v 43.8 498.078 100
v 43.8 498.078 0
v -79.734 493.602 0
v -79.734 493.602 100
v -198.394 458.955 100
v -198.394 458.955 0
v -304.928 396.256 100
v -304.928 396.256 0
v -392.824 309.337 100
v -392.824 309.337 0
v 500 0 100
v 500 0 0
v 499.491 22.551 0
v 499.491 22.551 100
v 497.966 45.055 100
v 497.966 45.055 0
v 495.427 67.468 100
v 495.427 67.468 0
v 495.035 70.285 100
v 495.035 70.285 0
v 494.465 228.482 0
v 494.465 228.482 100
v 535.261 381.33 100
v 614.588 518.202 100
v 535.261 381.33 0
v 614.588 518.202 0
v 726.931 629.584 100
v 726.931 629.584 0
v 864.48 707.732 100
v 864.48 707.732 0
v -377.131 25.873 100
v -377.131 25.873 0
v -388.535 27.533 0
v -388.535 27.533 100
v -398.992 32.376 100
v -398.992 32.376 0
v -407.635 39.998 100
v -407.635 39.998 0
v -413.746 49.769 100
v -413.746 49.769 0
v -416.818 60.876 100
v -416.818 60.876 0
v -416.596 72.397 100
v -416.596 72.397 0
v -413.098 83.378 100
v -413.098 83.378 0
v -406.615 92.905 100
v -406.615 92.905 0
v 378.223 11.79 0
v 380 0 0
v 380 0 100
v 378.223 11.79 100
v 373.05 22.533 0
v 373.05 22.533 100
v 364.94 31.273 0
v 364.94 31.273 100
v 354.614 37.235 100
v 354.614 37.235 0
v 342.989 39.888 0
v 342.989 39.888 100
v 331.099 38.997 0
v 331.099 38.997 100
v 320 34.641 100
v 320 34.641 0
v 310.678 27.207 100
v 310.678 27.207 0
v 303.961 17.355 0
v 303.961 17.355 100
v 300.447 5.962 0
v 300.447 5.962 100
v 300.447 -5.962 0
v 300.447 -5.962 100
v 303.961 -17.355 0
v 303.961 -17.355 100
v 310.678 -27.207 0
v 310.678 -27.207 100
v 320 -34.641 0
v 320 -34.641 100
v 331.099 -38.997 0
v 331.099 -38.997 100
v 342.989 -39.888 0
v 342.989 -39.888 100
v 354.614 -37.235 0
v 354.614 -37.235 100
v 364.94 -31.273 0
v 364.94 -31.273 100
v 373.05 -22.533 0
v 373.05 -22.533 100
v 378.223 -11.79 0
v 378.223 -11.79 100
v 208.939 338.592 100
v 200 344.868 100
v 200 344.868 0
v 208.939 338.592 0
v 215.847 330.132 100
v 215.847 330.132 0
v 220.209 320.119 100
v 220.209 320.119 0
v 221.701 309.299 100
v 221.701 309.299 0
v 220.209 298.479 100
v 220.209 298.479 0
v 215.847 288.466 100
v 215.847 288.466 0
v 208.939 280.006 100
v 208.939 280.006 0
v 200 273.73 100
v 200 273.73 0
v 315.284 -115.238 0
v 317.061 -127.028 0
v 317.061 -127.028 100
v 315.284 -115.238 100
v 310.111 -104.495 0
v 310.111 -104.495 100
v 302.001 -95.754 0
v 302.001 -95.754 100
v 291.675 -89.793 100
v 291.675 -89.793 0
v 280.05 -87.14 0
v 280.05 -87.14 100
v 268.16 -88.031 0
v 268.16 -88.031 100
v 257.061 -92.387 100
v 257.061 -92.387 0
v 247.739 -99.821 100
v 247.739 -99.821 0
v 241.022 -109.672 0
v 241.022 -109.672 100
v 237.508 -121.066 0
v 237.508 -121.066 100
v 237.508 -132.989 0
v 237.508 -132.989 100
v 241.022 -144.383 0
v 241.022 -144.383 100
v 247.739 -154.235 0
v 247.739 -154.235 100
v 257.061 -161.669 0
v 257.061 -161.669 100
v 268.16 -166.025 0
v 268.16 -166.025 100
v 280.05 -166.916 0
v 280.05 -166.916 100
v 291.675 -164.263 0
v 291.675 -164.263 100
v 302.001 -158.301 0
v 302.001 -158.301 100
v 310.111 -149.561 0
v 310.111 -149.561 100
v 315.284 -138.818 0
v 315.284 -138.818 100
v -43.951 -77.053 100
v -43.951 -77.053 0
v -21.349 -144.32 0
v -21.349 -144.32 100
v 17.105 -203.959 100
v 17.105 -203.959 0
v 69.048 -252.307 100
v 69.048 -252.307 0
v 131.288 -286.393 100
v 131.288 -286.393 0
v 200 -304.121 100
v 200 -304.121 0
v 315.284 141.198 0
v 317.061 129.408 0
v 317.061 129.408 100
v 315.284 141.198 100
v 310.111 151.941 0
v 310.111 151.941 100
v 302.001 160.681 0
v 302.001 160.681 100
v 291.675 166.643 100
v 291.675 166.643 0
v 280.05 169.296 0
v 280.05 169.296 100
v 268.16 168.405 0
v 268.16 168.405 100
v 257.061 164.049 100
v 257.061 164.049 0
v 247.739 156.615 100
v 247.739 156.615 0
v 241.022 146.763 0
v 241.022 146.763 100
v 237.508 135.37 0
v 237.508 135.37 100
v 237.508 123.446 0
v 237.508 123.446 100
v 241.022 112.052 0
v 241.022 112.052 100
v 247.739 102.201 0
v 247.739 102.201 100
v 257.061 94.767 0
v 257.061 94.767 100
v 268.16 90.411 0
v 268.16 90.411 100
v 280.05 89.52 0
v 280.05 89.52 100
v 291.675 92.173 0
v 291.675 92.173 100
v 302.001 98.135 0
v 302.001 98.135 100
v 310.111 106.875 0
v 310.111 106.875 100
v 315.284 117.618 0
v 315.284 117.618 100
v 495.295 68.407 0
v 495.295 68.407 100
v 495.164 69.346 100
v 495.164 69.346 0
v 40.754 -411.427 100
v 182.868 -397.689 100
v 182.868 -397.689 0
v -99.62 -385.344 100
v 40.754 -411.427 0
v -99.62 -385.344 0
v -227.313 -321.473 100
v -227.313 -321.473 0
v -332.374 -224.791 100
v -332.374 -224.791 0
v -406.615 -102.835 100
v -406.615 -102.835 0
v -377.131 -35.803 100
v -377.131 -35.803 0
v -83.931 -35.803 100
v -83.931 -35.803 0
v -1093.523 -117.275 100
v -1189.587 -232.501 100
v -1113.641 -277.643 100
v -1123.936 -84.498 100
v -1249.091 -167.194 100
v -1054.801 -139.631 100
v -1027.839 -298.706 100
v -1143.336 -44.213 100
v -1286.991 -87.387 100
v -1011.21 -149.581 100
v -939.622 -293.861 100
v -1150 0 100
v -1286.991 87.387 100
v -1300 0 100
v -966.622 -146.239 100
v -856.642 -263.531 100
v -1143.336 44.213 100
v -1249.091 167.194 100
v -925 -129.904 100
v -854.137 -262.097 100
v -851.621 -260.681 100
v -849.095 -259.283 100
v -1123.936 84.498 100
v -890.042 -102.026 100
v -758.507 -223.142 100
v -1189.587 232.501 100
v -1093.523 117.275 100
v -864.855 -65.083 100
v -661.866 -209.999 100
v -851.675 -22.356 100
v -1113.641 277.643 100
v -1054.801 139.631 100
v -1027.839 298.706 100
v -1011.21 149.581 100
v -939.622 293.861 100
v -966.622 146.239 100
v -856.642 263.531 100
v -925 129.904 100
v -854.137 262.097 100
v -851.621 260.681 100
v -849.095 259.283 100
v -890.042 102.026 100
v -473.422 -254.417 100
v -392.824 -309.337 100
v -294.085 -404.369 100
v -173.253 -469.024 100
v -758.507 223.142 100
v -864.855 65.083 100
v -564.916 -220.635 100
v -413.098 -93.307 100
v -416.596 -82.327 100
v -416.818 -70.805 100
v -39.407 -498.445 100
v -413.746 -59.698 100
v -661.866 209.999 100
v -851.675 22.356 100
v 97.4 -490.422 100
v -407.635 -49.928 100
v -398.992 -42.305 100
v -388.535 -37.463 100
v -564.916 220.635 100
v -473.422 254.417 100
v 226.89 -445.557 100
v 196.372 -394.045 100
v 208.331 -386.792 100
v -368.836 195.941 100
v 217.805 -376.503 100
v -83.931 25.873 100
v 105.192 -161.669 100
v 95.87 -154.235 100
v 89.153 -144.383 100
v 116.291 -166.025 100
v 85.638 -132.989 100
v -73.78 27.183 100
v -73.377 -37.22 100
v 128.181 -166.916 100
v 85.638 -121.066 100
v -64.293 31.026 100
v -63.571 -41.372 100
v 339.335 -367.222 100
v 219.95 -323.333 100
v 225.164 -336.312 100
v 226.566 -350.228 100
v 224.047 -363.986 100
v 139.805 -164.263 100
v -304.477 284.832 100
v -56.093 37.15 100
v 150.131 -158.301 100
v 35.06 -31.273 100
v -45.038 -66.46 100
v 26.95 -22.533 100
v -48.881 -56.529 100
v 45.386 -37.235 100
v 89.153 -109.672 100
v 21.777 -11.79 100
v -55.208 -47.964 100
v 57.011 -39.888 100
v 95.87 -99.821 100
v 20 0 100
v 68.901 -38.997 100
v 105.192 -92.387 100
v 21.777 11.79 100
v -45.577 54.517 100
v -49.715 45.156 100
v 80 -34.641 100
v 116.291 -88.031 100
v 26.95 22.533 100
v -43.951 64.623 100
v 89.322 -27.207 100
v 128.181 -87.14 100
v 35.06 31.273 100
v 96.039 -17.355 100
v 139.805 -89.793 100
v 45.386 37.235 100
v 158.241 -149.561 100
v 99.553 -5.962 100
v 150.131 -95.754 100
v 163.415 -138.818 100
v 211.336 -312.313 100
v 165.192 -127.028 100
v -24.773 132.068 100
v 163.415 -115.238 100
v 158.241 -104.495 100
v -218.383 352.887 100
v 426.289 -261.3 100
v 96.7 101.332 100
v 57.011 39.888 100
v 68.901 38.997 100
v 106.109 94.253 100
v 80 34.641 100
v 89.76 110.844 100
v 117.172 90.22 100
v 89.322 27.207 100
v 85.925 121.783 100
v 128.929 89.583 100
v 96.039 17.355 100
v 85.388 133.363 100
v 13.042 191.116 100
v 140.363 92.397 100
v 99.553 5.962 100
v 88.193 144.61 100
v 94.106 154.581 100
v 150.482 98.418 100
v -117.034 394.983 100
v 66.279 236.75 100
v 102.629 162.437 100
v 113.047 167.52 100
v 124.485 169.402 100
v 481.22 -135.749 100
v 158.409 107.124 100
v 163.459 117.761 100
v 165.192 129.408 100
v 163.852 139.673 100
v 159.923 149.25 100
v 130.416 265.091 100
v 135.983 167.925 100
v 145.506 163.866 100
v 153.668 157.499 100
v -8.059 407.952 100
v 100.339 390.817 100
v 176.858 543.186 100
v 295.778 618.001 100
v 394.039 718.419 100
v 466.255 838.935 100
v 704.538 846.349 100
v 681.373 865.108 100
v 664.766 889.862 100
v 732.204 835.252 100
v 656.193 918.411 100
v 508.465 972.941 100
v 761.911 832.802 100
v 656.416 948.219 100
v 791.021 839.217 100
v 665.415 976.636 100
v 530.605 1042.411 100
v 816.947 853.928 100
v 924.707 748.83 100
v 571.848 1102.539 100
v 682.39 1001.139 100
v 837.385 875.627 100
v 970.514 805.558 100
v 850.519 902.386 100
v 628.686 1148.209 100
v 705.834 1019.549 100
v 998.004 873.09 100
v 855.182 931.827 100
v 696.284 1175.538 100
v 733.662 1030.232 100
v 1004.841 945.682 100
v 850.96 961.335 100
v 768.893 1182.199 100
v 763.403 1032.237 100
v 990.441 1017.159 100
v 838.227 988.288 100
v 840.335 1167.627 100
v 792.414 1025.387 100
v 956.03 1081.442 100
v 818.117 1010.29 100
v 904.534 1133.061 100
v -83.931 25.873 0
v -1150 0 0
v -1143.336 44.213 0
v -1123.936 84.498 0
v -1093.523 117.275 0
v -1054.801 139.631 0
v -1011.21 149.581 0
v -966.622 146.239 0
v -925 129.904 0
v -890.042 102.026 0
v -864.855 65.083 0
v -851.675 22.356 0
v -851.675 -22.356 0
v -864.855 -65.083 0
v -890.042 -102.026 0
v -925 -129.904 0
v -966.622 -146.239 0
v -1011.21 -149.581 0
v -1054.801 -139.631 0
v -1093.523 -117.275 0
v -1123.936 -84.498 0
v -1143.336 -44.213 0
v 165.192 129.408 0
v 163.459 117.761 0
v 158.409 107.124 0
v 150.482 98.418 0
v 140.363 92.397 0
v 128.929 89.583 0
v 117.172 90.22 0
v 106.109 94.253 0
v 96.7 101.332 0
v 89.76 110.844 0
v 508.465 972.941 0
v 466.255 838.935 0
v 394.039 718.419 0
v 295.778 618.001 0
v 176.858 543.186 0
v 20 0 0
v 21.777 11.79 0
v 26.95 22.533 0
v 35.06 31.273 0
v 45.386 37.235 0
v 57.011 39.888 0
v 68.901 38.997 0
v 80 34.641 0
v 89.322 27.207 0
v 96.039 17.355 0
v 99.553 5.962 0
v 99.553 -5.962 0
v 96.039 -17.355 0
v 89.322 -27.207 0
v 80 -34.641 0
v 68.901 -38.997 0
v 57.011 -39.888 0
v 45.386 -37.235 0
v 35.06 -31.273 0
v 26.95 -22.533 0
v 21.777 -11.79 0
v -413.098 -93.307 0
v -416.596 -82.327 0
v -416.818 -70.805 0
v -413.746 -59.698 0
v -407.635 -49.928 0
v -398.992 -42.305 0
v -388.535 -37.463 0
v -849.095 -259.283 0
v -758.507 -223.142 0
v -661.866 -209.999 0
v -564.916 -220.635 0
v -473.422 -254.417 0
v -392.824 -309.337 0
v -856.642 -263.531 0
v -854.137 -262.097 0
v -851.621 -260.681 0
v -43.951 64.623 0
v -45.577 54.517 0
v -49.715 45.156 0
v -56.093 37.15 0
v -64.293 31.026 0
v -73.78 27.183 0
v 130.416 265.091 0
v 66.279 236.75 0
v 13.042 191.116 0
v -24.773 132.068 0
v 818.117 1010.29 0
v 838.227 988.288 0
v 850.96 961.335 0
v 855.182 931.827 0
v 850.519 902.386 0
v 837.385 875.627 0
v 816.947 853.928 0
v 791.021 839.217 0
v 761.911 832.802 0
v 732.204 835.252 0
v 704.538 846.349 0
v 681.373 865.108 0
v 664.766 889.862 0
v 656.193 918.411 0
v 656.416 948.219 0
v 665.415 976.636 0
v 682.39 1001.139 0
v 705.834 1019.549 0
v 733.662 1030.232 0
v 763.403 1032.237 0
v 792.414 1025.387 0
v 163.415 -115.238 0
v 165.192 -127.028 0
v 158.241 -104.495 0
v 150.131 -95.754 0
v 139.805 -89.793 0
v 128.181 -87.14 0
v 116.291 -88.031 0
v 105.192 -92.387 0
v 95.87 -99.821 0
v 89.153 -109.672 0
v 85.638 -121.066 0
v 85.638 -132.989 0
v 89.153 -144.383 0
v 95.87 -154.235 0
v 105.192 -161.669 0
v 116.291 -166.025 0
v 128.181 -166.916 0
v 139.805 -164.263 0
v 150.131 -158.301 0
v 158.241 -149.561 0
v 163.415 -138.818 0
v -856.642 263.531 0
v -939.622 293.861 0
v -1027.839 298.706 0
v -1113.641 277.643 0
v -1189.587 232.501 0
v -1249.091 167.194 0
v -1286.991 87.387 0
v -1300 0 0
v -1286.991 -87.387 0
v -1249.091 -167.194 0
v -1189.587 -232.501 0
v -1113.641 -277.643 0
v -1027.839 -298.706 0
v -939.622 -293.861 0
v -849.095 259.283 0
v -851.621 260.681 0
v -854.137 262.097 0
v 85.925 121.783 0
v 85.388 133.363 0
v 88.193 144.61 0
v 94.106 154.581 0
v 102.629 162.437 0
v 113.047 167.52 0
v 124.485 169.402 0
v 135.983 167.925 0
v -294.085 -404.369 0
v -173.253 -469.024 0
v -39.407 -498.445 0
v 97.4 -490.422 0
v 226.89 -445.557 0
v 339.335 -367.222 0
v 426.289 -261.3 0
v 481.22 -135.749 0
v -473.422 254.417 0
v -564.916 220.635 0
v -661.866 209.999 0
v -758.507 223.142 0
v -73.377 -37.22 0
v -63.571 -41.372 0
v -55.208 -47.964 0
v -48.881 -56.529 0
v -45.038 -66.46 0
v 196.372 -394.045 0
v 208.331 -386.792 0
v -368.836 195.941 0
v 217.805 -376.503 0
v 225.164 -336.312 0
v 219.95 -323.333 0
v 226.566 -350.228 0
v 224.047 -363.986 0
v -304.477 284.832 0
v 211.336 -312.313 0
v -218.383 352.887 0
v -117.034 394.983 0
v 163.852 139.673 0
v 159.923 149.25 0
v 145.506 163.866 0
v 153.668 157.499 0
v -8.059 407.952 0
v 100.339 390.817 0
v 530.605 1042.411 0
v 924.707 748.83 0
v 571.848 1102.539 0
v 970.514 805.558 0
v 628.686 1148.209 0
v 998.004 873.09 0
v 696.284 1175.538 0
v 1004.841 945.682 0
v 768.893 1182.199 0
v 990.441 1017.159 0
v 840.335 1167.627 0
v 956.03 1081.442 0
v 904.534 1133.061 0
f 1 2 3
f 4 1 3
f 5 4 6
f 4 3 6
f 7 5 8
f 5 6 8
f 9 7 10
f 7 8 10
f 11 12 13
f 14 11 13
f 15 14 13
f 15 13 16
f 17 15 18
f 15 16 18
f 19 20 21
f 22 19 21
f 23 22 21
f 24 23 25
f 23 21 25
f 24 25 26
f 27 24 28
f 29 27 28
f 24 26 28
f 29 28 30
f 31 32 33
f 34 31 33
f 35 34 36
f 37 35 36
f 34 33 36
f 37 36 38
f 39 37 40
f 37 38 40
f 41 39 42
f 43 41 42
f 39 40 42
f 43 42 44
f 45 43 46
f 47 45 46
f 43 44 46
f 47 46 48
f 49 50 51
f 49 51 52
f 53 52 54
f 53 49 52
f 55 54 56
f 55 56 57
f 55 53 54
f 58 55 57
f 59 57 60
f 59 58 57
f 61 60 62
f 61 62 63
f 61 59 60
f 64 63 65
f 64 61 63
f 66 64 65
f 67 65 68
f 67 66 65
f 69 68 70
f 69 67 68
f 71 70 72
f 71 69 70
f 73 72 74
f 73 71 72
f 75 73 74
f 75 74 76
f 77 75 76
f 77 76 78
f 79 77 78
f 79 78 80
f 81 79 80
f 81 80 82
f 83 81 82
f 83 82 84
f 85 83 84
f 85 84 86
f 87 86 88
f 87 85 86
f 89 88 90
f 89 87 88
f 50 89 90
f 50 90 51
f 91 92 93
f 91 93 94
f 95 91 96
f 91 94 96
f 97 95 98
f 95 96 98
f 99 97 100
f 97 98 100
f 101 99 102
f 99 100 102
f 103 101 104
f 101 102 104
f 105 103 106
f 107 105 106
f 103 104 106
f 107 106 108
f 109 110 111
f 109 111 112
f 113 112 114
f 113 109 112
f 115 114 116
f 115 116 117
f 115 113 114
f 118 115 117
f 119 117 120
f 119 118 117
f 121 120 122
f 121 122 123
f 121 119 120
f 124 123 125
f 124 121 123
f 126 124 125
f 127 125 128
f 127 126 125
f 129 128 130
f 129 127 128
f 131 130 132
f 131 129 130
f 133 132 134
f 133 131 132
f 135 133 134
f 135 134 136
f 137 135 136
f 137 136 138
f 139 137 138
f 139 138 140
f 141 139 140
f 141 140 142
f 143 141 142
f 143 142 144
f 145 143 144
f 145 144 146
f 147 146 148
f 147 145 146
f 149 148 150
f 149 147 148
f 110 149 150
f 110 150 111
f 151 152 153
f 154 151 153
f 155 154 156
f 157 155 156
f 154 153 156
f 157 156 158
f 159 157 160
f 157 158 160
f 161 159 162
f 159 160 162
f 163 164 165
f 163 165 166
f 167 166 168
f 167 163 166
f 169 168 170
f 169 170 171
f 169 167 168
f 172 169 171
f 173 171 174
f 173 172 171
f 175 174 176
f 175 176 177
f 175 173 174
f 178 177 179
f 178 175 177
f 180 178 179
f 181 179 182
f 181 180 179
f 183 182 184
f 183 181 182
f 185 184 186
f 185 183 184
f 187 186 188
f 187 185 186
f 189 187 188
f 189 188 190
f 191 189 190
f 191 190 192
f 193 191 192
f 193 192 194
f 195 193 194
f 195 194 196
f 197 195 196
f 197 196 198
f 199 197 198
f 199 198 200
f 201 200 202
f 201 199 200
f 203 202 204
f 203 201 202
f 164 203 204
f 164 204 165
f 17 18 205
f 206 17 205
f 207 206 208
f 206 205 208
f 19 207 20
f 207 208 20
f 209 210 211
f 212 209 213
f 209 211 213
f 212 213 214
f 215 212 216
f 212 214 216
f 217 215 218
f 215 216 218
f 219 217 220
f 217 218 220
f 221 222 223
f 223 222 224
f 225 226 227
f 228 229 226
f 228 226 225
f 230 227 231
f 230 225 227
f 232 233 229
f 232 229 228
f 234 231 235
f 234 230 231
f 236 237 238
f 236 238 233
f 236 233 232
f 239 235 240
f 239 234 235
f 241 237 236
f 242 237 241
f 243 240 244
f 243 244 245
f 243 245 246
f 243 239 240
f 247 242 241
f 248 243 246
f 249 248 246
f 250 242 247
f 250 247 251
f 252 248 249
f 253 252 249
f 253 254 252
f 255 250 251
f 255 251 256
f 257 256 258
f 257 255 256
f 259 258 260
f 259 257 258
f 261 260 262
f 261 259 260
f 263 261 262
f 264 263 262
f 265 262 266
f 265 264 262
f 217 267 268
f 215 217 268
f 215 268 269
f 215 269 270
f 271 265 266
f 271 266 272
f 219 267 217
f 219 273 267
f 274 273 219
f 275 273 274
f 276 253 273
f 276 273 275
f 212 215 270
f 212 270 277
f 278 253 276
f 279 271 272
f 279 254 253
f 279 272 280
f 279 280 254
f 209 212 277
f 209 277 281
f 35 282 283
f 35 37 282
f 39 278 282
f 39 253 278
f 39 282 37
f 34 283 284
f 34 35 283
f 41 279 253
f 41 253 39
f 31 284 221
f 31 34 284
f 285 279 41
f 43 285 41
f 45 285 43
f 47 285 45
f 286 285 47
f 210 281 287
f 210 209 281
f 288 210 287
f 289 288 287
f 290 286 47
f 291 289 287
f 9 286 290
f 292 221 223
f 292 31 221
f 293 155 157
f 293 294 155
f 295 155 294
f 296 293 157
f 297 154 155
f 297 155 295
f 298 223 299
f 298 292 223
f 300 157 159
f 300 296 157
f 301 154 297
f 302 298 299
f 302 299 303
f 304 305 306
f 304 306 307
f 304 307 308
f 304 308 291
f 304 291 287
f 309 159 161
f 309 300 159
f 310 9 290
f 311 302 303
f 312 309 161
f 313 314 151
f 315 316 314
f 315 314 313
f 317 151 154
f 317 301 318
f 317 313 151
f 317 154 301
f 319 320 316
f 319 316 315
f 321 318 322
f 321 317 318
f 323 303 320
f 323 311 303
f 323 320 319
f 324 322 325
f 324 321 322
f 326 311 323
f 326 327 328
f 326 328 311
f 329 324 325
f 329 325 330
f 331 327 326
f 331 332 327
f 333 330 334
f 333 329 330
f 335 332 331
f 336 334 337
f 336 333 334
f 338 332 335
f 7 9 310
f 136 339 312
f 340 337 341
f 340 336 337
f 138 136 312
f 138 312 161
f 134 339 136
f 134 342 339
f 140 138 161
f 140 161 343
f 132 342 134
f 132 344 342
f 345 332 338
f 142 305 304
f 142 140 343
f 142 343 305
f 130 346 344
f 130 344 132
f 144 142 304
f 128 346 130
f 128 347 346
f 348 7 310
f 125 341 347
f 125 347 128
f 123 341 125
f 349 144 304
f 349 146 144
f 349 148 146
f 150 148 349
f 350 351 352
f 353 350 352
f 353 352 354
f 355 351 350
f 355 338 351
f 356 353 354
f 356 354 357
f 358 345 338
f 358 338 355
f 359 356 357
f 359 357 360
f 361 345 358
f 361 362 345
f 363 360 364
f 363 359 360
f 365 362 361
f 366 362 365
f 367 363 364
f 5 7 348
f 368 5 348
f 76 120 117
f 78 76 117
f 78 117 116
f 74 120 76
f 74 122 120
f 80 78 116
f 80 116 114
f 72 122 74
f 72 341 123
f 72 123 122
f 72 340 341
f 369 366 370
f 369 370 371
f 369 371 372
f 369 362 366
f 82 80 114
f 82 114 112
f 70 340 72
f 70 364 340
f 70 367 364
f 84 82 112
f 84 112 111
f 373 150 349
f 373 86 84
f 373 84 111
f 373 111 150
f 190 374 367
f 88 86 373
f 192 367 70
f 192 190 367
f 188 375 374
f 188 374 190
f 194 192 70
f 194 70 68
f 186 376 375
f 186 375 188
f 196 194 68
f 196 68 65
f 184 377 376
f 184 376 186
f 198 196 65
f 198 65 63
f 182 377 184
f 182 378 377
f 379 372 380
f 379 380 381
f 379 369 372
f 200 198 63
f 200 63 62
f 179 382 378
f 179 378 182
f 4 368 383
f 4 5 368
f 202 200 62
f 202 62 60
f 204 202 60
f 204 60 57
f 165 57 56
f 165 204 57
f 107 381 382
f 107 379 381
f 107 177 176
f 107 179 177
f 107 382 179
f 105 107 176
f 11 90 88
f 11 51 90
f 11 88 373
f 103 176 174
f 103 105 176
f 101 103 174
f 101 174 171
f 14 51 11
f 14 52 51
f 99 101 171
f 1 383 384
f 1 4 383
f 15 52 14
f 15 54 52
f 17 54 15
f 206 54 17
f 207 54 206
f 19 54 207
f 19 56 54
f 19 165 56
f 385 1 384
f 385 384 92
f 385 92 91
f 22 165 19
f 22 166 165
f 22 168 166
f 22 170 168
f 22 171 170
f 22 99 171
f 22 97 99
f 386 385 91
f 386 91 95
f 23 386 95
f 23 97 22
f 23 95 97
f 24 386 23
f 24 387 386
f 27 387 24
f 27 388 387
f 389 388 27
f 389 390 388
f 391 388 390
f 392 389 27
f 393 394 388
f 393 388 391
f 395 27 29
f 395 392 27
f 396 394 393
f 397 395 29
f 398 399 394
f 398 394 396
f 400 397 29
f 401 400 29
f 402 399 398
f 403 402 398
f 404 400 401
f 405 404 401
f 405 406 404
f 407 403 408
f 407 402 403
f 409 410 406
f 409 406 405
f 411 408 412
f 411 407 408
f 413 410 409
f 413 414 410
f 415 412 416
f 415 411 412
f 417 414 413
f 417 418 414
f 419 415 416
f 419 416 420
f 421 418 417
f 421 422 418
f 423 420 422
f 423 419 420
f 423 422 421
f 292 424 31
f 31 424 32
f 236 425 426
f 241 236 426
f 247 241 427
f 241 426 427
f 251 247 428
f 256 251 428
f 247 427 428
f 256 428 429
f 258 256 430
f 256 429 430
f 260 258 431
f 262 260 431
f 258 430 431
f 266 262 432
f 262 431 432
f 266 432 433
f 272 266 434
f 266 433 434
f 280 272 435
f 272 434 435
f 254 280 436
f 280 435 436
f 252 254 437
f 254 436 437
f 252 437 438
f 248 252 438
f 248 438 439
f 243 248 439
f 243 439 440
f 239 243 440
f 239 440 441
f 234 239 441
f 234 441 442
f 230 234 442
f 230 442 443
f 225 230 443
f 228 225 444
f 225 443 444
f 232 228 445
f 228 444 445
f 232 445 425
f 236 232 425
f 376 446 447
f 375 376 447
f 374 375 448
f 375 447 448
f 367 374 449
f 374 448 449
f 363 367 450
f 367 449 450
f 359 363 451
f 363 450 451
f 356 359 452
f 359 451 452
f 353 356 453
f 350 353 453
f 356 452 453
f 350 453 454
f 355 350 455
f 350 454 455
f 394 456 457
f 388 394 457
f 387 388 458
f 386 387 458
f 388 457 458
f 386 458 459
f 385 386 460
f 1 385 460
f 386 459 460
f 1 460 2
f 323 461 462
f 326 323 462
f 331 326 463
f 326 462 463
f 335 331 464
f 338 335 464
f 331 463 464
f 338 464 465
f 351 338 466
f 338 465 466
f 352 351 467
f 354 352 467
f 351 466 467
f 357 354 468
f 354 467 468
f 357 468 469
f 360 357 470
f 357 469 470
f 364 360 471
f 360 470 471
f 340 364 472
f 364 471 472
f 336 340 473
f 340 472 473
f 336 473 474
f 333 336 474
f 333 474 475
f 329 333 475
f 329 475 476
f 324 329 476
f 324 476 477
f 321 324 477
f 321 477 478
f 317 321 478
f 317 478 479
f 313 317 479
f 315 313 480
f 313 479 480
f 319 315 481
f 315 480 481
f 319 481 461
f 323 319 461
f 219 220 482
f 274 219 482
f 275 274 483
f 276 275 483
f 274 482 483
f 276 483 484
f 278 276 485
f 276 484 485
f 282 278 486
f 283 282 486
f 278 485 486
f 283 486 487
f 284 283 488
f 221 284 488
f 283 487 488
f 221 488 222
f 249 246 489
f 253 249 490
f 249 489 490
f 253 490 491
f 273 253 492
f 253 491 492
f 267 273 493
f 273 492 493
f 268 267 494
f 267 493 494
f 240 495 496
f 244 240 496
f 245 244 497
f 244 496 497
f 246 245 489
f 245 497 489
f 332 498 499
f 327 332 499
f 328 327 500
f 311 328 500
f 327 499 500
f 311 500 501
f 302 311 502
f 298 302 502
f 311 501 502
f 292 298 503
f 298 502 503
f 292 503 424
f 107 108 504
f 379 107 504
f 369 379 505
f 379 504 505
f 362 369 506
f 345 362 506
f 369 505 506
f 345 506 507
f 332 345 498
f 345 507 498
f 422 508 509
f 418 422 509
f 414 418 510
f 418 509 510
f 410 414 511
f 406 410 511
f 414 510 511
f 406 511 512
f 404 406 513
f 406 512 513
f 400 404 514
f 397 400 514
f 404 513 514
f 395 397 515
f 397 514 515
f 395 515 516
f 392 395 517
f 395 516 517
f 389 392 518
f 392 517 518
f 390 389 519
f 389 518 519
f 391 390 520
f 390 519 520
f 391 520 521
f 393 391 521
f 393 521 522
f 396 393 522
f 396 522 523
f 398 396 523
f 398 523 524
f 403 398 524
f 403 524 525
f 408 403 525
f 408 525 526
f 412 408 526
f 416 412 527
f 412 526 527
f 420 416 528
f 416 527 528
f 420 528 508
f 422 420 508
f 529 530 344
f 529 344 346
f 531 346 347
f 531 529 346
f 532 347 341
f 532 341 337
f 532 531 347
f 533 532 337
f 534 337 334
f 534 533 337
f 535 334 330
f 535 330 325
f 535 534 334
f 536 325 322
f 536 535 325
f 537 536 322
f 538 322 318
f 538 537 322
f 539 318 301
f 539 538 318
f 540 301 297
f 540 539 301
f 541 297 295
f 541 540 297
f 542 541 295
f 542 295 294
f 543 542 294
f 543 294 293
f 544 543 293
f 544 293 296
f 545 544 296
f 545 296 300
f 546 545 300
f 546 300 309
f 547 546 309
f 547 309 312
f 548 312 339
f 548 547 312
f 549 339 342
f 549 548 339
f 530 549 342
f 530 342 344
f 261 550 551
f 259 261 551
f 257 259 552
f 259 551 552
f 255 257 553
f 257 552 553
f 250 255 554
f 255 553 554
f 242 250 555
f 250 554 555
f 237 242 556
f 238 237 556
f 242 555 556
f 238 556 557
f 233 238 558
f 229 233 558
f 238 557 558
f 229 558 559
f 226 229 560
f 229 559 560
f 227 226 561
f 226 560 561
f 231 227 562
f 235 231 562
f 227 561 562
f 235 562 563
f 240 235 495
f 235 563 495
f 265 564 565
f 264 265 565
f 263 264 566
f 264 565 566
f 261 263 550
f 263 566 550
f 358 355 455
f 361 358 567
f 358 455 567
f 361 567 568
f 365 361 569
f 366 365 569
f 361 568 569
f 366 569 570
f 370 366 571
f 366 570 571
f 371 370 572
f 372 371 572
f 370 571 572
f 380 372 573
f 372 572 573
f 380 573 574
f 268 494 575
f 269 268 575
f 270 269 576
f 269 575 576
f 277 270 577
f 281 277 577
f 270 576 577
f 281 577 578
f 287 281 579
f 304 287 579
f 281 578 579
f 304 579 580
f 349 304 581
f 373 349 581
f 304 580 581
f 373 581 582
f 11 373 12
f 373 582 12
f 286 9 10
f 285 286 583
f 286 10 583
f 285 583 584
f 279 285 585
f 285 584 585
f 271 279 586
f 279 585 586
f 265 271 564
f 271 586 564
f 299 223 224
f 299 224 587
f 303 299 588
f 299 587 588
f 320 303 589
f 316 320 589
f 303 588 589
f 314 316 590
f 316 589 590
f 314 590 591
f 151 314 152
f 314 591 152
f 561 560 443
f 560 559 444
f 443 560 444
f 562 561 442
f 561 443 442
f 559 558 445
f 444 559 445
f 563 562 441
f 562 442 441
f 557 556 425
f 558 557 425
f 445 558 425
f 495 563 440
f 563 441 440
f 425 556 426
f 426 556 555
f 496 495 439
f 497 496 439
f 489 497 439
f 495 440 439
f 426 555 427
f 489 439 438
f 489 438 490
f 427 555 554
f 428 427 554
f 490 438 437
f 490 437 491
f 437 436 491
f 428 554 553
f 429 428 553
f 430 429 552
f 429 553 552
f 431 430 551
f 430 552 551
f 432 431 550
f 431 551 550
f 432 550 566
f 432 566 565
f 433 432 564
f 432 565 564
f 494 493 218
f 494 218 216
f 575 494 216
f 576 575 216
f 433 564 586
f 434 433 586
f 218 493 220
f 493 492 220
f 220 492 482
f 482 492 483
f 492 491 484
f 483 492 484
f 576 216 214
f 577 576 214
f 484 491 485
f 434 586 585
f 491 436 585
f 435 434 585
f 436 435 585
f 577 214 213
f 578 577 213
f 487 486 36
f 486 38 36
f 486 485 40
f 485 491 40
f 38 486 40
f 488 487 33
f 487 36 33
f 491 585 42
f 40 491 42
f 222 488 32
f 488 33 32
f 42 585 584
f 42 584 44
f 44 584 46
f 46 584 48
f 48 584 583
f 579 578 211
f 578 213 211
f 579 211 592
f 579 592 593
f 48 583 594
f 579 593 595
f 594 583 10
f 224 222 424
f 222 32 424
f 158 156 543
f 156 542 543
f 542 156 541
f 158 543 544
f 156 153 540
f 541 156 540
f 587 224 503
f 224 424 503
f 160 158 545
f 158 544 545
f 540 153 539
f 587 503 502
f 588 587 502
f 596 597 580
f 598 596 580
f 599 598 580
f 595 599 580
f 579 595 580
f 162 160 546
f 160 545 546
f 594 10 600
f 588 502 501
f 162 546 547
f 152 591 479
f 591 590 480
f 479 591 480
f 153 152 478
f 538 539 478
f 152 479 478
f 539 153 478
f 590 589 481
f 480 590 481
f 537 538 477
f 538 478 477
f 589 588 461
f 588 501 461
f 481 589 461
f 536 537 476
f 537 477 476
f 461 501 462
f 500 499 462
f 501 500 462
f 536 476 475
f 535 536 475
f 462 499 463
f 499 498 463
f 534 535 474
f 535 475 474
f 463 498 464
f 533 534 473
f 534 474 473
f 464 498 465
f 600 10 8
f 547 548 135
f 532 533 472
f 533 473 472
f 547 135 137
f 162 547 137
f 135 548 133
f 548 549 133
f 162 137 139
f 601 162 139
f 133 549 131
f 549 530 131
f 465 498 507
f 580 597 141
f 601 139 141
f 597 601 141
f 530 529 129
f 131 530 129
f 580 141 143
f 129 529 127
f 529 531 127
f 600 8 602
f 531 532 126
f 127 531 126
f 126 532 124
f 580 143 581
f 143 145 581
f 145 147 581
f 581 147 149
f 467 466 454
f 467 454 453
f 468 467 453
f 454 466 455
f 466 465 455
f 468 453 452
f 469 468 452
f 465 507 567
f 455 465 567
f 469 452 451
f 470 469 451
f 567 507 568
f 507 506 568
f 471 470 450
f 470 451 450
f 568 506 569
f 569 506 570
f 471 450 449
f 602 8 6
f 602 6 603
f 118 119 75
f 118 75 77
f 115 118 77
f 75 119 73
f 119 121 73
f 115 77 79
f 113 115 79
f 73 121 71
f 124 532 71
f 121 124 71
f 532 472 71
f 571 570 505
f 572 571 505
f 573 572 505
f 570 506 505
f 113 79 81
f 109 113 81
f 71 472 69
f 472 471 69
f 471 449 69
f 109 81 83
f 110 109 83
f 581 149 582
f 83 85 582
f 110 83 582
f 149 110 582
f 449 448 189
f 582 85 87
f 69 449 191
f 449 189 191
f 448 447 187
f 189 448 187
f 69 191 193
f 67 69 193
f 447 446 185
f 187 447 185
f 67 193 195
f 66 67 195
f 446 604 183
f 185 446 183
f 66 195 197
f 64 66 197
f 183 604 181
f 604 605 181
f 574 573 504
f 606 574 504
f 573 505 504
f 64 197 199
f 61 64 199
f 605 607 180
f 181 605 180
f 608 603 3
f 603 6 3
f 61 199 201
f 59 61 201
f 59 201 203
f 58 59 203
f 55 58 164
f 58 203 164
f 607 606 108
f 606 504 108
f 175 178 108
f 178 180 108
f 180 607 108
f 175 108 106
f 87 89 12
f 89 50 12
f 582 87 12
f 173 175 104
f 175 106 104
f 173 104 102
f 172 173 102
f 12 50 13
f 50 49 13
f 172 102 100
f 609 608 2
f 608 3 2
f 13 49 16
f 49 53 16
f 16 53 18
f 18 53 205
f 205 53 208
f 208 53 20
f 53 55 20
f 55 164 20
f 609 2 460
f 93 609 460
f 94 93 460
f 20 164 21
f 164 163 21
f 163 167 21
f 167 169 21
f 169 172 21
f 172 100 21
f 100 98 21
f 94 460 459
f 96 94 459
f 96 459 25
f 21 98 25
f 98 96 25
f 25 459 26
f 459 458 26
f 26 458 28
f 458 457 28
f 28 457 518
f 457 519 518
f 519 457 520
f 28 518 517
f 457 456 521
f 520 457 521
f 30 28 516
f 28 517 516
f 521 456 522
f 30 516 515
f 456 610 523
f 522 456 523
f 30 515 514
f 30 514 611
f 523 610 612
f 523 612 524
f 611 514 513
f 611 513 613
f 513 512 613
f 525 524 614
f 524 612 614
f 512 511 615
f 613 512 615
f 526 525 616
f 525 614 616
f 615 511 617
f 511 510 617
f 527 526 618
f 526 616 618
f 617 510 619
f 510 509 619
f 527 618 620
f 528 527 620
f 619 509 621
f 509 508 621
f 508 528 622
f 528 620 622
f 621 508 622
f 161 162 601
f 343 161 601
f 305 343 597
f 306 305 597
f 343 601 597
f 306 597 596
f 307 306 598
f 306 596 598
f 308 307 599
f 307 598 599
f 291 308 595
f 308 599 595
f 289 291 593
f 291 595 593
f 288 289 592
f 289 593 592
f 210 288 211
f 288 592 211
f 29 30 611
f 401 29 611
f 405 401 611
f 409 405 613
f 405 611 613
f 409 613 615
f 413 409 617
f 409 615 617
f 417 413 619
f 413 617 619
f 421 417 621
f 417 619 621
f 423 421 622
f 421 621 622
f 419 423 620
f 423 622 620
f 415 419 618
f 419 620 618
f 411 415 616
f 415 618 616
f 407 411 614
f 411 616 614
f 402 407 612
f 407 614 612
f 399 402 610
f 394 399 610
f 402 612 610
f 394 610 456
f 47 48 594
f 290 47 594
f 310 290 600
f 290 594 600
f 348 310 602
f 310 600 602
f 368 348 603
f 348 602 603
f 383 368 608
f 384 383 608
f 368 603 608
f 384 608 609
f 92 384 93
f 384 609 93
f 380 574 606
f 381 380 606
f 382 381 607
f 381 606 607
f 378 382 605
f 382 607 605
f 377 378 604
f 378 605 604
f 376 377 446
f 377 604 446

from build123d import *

# Parameters (mm, degrees)
F0_R     = 40
F1_DEPTH = 100


with BuildPart() as f1:
    # F0 (on Top) → F1 (new body)
    with BuildSketch(Plane.XY):
        with BuildLine():
            ThreePointArc((-849.0953685383, -259.2832277711), (-739.9313653682, -149.5470002399), (-700, 0))
            Line((-700, 0), (-850, 0))
            ThreePointArc((-850, 0), (-1000, -150), (-1150, 0))
            Line((-1150, 0), (-1300, 0))
            ThreePointArc((-1300, 0), (-1153.2850393406, -257.8831066867), (-856.6420219043, -263.5308143582))
            ThreePointArc((-856.6420219043, -263.5308143582), (-852.8801904642, -261.3865975578), (-849.0953685383, -259.2832277711))
        make_face()
        with BuildLine():
            ThreePointArc((-849.0953685383, 259.2832277711), (-739.9313653682, 149.5470002399), (-700, 0))
            Line((-700, 0), (-500, 0))
            ThreePointArc((-500, 0), (-472.4467242206, 163.6890123778), (-392.8236289072, 309.3373507551))
            ThreePointArc((-392.8236289072, 309.3373507551), (-613.0653910459, 212.3510174227), (-849.0953685383, 259.2832277711))
        make_face()
        with BuildLine():
            Line((-850, 0), (-700, 0))
            ThreePointArc((-700, 0), (-739.9313653682, 149.5470002399), (-849.0953685383, 259.2832277711))
            ThreePointArc((-849.0953685383, 259.2832277711), (-852.8801904642, 261.3865975578), (-856.6420219043, 263.5308143582))
            ThreePointArc((-856.6420219043, 263.5308143582), (-1153.2850393406, 257.8831066867), (-1300, 0))
            Line((-1300, 0), (-1150, 0))
            ThreePointArc((-1150, 0), (-1000, 150), (-850, 0))
        make_face()
        with BuildLine():
            Line((-500, 0), (-700, 0))
            ThreePointArc((-700, 0), (-739.9313653682, -149.5470002399), (-849.0953685383, -259.2832277711))
            ThreePointArc((-849.0953685383, -259.2832277711), (-613.0653910459, -212.3510174227), (-392.8236289072, -309.3373507551))
            ThreePointArc((-392.8236289072, -309.3373507551), (-472.4467242206, -163.6890123778), (-500, 0))
        make_face()
        with BuildLine():
            ThreePointArc((-392.8236289072, 309.3373507551), (-472.4467242206, 163.6890123778), (-500, 0))
            Line((-500, 0), (-20, 0))
            ThreePointArc((-20, 0), (36.5716696241, 147.2792613729), (177.1925530051, 218.8145798652))
            Line((177.1925530051, 218.8145798652), (314.6601955249, 388.5729807285))
            ThreePointArc((314.6601955249, 388.5729807285), (187.4065310938, 463.5502045123), (43.7997133909, 498.0778906023))
            ThreePointArc((43.7997133909, 498.0778906023), (-198.3939798634, 458.9551489568), (-392.8236289072, 309.3373507551))
        make_face()
        with BuildLine():
            ThreePointArc((-406.6148611623, 92.9051428836), (-169.1586966122, 377.4272459242), (200, 344.8678553104))
            ThreePointArc((200, 344.8678553104), (221.7006400578, 309.2991411686), (200, 273.7304270267))
            ThreePointArc((200, 273.7304270267), (37.9889182283, 215.8833684246), (-43.9509044765, 64.6228704059))
            ThreePointArc((-43.9509044765, 64.6228704059), (-56.0926702606, 37.1503028891), (-83.9313566685, 25.8732473601))
            Line((-83.9313566685, 25.8732473601), (-377.1313636694, 25.8732473601))
            ThreePointArc((-377.1313636694, 25.8732473601), (-413.7460862611, 49.7685247754), (-406.6148611623, 92.9051428836))
        make_face(mode=Mode.SUBTRACT)
        with BuildLine():
            Line((-20, 0), (-500, 0))
            ThreePointArc((-500, 0), (-472.4467242206, -163.6890123778), (-392.8236289072, -309.3373507551))
            ThreePointArc((-392.8236289072, -309.3373507551), (163.6890123778, -472.4467242206), (500, 0))
            ThreePointArc((500, 0), (498.8554636471, 33.8116309782), (495.4270944424, 67.4684673932))
            ThreePointArc((495.4270944424, 67.4684673932), (495.2295651607, 68.8764953304), (495.0353730255, 70.2849873978))
            ThreePointArc((495.0353730255, 70.2849873978), (435.0040690697, 246.5186806164), (314.6601955249, 388.5729807285))
            Line((314.6601955249, 388.5729807285), (177.1925530051, 218.8145798652))
            ThreePointArc((177.1925530051, 218.8145798652), (347.2792613729, 163.4283303759), (420, 0))
            ThreePointArc((420, 0), (200, -220), (-20, 0))
        make_face()
        with BuildLine():
            ThreePointArc((-406.6148611623, -102.8346635677), (-413.7460862611, -59.6980454595), (-377.1313636694, -35.8027680442))
            Line((-377.1313636694, -35.8027680442), (-83.9313566685, -35.8027680442))
            ThreePointArc((-83.9313566685, -35.8027680442), (-55.2084121975, -47.9640816364), (-43.9509044765, -77.0531449985))
            ThreePointArc((-43.9509044765, -77.0531449985), (41.5727461521, -229.7491196269), (200, -304.1208933235))
            ThreePointArc((200, -304.1208933235), (225.7915227703, -357.1958613892), (182.8680932522, -397.6894915104))
            ThreePointArc((182.8680932522, -397.6894915104), (-165.7061110263, -357.8861419627), (-406.6148611623, -102.8346635677))
        make_face(mode=Mode.SUBTRACT)
        with BuildLine():
            ThreePointArc((177.1925530051, 218.8145798652), (36.5716696241, 147.2792613729), (-20, 0))
            Line((-20, 0), (0, 0))
            Line((0, 0), (89.7600051949, 110.8443751857))
            ThreePointArc((89.7600051949, 110.8443751857), (94.1057606724, 154.5806536289), (135.9827631274, 167.9247275238))
            Line((135.9827631274, 167.9247275238), (177.1925530051, 218.8145798652))
        make_face()
        with BuildLine():
            Line((0, 0), (-20, 0))
            ThreePointArc((-20, 0), (200, -220), (420, 0))
            ThreePointArc((420, 0), (347.2792613729, 163.4283303759), (177.1925530051, 218.8145798652))
            Line((177.1925530051, 218.8145798652), (135.9827631274, 167.9247275238))
            ThreePointArc((135.9827631274, 167.9247275238), (157.0635818103, 153.5775860217), (165.1915991306, 129.4078379869))
            ThreePointArc((165.1915991306, 129.4078379869), (134.750266469, 90.5667273088), (89.7600051949, 110.8443751857))
            Line((89.7600051949, 110.8443751857), (0, 0))
        make_face()
        with Locations((125.1915991306, -127.0277351141)):
            Circle(F0_R, mode=Mode.SUBTRACT)
        with Locations((277.0611941814, -127.0277351141)):
            Circle(F0_R, mode=Mode.SUBTRACT)
        with BuildLine():
            ThreePointArc((100, 0), (60, -40), (20, 0))
            ThreePointArc((20, 0), (60, 40), (100, 0))
        make_face(mode=Mode.SUBTRACT)
        with Locations((340, 0)):
            Circle(F0_R, mode=Mode.SUBTRACT)
        with Locations((277.0611941814, 129.4078379869)):
            Circle(F0_R, mode=Mode.SUBTRACT)
        with BuildLine():
            ThreePointArc((508.4647709692, 972.9408629012), (347.8579835974, 665.3239807328), (43.7997133909, 498.0778906023))
            ThreePointArc((43.7997133909, 498.0778906023), (187.4065310938, 463.5502045123), (314.6601955249, 388.5729807285))
            Line((314.6601955249, 388.5729807285), (597.8543714973, 738.2886633841))
            ThreePointArc((597.8543714973, 738.2886633841), (521.5619679737, 843.5778116935), (508.4647709692, 972.9408629012))
        make_face()
        with BuildLine():
            Line((597.8543714973, 738.2886633841), (314.6601955249, 388.5729807285))
            ThreePointArc((314.6601955249, 388.5729807285), (435.0040690697, 246.5186806164), (495.0353730255, 70.2849873978))
            ThreePointArc((495.0353730255, 70.2849873978), (564.4809221518, 441.9510892686), (842.4187636125, 698.2886242833))
            ThreePointArc((842.4187636125, 698.2886242833), (714.8315735034, 685.8533594049), (597.8543714973, 738.2886633841))
        make_face()
        with BuildLine():
            ThreePointArc((1005.1844692598, 932.5751537484), (775.4338572426, 1181.7537288433), (508.4647709692, 972.9408629012))
            ThreePointArc((508.4647709692, 972.9408629012), (521.5619679737, 843.5778116935), (597.8543714973, 738.2886633841))
            ThreePointArc((597.8543714973, 738.2886633841), (714.8315735034, 685.8533594049), (842.4187636125, 698.2886242833))
            ThreePointArc((842.4187636125, 698.2886242833), (853.4019929681, 703.1204808996), (864.4796509854, 707.7317343393))
            ThreePointArc((864.4796509854, 707.7317343393), (967.1087428004, 799.9550109182), (1005.1844692598, 932.5751537484))
        make_face()
        with BuildLine():
            ThreePointArc((855.1844692598, 932.5751537484), (798.2355789406, 842.3166253134), (692.2524301548, 854.8605576027))
            ThreePointArc((692.2524301548, 854.8605576027), (677.4698731141, 995.5071928533), (818.1165083648, 1010.2897498941))
            ThreePointArc((818.1165083648, 1010.2897498941), (845.4429976948, 975.6262634292), (855.1844692598, 932.5751537484))
        make_face(mode=Mode.SUBTRACT)
    extrude(amount=F1_DEPTH)


solid = f1.part
